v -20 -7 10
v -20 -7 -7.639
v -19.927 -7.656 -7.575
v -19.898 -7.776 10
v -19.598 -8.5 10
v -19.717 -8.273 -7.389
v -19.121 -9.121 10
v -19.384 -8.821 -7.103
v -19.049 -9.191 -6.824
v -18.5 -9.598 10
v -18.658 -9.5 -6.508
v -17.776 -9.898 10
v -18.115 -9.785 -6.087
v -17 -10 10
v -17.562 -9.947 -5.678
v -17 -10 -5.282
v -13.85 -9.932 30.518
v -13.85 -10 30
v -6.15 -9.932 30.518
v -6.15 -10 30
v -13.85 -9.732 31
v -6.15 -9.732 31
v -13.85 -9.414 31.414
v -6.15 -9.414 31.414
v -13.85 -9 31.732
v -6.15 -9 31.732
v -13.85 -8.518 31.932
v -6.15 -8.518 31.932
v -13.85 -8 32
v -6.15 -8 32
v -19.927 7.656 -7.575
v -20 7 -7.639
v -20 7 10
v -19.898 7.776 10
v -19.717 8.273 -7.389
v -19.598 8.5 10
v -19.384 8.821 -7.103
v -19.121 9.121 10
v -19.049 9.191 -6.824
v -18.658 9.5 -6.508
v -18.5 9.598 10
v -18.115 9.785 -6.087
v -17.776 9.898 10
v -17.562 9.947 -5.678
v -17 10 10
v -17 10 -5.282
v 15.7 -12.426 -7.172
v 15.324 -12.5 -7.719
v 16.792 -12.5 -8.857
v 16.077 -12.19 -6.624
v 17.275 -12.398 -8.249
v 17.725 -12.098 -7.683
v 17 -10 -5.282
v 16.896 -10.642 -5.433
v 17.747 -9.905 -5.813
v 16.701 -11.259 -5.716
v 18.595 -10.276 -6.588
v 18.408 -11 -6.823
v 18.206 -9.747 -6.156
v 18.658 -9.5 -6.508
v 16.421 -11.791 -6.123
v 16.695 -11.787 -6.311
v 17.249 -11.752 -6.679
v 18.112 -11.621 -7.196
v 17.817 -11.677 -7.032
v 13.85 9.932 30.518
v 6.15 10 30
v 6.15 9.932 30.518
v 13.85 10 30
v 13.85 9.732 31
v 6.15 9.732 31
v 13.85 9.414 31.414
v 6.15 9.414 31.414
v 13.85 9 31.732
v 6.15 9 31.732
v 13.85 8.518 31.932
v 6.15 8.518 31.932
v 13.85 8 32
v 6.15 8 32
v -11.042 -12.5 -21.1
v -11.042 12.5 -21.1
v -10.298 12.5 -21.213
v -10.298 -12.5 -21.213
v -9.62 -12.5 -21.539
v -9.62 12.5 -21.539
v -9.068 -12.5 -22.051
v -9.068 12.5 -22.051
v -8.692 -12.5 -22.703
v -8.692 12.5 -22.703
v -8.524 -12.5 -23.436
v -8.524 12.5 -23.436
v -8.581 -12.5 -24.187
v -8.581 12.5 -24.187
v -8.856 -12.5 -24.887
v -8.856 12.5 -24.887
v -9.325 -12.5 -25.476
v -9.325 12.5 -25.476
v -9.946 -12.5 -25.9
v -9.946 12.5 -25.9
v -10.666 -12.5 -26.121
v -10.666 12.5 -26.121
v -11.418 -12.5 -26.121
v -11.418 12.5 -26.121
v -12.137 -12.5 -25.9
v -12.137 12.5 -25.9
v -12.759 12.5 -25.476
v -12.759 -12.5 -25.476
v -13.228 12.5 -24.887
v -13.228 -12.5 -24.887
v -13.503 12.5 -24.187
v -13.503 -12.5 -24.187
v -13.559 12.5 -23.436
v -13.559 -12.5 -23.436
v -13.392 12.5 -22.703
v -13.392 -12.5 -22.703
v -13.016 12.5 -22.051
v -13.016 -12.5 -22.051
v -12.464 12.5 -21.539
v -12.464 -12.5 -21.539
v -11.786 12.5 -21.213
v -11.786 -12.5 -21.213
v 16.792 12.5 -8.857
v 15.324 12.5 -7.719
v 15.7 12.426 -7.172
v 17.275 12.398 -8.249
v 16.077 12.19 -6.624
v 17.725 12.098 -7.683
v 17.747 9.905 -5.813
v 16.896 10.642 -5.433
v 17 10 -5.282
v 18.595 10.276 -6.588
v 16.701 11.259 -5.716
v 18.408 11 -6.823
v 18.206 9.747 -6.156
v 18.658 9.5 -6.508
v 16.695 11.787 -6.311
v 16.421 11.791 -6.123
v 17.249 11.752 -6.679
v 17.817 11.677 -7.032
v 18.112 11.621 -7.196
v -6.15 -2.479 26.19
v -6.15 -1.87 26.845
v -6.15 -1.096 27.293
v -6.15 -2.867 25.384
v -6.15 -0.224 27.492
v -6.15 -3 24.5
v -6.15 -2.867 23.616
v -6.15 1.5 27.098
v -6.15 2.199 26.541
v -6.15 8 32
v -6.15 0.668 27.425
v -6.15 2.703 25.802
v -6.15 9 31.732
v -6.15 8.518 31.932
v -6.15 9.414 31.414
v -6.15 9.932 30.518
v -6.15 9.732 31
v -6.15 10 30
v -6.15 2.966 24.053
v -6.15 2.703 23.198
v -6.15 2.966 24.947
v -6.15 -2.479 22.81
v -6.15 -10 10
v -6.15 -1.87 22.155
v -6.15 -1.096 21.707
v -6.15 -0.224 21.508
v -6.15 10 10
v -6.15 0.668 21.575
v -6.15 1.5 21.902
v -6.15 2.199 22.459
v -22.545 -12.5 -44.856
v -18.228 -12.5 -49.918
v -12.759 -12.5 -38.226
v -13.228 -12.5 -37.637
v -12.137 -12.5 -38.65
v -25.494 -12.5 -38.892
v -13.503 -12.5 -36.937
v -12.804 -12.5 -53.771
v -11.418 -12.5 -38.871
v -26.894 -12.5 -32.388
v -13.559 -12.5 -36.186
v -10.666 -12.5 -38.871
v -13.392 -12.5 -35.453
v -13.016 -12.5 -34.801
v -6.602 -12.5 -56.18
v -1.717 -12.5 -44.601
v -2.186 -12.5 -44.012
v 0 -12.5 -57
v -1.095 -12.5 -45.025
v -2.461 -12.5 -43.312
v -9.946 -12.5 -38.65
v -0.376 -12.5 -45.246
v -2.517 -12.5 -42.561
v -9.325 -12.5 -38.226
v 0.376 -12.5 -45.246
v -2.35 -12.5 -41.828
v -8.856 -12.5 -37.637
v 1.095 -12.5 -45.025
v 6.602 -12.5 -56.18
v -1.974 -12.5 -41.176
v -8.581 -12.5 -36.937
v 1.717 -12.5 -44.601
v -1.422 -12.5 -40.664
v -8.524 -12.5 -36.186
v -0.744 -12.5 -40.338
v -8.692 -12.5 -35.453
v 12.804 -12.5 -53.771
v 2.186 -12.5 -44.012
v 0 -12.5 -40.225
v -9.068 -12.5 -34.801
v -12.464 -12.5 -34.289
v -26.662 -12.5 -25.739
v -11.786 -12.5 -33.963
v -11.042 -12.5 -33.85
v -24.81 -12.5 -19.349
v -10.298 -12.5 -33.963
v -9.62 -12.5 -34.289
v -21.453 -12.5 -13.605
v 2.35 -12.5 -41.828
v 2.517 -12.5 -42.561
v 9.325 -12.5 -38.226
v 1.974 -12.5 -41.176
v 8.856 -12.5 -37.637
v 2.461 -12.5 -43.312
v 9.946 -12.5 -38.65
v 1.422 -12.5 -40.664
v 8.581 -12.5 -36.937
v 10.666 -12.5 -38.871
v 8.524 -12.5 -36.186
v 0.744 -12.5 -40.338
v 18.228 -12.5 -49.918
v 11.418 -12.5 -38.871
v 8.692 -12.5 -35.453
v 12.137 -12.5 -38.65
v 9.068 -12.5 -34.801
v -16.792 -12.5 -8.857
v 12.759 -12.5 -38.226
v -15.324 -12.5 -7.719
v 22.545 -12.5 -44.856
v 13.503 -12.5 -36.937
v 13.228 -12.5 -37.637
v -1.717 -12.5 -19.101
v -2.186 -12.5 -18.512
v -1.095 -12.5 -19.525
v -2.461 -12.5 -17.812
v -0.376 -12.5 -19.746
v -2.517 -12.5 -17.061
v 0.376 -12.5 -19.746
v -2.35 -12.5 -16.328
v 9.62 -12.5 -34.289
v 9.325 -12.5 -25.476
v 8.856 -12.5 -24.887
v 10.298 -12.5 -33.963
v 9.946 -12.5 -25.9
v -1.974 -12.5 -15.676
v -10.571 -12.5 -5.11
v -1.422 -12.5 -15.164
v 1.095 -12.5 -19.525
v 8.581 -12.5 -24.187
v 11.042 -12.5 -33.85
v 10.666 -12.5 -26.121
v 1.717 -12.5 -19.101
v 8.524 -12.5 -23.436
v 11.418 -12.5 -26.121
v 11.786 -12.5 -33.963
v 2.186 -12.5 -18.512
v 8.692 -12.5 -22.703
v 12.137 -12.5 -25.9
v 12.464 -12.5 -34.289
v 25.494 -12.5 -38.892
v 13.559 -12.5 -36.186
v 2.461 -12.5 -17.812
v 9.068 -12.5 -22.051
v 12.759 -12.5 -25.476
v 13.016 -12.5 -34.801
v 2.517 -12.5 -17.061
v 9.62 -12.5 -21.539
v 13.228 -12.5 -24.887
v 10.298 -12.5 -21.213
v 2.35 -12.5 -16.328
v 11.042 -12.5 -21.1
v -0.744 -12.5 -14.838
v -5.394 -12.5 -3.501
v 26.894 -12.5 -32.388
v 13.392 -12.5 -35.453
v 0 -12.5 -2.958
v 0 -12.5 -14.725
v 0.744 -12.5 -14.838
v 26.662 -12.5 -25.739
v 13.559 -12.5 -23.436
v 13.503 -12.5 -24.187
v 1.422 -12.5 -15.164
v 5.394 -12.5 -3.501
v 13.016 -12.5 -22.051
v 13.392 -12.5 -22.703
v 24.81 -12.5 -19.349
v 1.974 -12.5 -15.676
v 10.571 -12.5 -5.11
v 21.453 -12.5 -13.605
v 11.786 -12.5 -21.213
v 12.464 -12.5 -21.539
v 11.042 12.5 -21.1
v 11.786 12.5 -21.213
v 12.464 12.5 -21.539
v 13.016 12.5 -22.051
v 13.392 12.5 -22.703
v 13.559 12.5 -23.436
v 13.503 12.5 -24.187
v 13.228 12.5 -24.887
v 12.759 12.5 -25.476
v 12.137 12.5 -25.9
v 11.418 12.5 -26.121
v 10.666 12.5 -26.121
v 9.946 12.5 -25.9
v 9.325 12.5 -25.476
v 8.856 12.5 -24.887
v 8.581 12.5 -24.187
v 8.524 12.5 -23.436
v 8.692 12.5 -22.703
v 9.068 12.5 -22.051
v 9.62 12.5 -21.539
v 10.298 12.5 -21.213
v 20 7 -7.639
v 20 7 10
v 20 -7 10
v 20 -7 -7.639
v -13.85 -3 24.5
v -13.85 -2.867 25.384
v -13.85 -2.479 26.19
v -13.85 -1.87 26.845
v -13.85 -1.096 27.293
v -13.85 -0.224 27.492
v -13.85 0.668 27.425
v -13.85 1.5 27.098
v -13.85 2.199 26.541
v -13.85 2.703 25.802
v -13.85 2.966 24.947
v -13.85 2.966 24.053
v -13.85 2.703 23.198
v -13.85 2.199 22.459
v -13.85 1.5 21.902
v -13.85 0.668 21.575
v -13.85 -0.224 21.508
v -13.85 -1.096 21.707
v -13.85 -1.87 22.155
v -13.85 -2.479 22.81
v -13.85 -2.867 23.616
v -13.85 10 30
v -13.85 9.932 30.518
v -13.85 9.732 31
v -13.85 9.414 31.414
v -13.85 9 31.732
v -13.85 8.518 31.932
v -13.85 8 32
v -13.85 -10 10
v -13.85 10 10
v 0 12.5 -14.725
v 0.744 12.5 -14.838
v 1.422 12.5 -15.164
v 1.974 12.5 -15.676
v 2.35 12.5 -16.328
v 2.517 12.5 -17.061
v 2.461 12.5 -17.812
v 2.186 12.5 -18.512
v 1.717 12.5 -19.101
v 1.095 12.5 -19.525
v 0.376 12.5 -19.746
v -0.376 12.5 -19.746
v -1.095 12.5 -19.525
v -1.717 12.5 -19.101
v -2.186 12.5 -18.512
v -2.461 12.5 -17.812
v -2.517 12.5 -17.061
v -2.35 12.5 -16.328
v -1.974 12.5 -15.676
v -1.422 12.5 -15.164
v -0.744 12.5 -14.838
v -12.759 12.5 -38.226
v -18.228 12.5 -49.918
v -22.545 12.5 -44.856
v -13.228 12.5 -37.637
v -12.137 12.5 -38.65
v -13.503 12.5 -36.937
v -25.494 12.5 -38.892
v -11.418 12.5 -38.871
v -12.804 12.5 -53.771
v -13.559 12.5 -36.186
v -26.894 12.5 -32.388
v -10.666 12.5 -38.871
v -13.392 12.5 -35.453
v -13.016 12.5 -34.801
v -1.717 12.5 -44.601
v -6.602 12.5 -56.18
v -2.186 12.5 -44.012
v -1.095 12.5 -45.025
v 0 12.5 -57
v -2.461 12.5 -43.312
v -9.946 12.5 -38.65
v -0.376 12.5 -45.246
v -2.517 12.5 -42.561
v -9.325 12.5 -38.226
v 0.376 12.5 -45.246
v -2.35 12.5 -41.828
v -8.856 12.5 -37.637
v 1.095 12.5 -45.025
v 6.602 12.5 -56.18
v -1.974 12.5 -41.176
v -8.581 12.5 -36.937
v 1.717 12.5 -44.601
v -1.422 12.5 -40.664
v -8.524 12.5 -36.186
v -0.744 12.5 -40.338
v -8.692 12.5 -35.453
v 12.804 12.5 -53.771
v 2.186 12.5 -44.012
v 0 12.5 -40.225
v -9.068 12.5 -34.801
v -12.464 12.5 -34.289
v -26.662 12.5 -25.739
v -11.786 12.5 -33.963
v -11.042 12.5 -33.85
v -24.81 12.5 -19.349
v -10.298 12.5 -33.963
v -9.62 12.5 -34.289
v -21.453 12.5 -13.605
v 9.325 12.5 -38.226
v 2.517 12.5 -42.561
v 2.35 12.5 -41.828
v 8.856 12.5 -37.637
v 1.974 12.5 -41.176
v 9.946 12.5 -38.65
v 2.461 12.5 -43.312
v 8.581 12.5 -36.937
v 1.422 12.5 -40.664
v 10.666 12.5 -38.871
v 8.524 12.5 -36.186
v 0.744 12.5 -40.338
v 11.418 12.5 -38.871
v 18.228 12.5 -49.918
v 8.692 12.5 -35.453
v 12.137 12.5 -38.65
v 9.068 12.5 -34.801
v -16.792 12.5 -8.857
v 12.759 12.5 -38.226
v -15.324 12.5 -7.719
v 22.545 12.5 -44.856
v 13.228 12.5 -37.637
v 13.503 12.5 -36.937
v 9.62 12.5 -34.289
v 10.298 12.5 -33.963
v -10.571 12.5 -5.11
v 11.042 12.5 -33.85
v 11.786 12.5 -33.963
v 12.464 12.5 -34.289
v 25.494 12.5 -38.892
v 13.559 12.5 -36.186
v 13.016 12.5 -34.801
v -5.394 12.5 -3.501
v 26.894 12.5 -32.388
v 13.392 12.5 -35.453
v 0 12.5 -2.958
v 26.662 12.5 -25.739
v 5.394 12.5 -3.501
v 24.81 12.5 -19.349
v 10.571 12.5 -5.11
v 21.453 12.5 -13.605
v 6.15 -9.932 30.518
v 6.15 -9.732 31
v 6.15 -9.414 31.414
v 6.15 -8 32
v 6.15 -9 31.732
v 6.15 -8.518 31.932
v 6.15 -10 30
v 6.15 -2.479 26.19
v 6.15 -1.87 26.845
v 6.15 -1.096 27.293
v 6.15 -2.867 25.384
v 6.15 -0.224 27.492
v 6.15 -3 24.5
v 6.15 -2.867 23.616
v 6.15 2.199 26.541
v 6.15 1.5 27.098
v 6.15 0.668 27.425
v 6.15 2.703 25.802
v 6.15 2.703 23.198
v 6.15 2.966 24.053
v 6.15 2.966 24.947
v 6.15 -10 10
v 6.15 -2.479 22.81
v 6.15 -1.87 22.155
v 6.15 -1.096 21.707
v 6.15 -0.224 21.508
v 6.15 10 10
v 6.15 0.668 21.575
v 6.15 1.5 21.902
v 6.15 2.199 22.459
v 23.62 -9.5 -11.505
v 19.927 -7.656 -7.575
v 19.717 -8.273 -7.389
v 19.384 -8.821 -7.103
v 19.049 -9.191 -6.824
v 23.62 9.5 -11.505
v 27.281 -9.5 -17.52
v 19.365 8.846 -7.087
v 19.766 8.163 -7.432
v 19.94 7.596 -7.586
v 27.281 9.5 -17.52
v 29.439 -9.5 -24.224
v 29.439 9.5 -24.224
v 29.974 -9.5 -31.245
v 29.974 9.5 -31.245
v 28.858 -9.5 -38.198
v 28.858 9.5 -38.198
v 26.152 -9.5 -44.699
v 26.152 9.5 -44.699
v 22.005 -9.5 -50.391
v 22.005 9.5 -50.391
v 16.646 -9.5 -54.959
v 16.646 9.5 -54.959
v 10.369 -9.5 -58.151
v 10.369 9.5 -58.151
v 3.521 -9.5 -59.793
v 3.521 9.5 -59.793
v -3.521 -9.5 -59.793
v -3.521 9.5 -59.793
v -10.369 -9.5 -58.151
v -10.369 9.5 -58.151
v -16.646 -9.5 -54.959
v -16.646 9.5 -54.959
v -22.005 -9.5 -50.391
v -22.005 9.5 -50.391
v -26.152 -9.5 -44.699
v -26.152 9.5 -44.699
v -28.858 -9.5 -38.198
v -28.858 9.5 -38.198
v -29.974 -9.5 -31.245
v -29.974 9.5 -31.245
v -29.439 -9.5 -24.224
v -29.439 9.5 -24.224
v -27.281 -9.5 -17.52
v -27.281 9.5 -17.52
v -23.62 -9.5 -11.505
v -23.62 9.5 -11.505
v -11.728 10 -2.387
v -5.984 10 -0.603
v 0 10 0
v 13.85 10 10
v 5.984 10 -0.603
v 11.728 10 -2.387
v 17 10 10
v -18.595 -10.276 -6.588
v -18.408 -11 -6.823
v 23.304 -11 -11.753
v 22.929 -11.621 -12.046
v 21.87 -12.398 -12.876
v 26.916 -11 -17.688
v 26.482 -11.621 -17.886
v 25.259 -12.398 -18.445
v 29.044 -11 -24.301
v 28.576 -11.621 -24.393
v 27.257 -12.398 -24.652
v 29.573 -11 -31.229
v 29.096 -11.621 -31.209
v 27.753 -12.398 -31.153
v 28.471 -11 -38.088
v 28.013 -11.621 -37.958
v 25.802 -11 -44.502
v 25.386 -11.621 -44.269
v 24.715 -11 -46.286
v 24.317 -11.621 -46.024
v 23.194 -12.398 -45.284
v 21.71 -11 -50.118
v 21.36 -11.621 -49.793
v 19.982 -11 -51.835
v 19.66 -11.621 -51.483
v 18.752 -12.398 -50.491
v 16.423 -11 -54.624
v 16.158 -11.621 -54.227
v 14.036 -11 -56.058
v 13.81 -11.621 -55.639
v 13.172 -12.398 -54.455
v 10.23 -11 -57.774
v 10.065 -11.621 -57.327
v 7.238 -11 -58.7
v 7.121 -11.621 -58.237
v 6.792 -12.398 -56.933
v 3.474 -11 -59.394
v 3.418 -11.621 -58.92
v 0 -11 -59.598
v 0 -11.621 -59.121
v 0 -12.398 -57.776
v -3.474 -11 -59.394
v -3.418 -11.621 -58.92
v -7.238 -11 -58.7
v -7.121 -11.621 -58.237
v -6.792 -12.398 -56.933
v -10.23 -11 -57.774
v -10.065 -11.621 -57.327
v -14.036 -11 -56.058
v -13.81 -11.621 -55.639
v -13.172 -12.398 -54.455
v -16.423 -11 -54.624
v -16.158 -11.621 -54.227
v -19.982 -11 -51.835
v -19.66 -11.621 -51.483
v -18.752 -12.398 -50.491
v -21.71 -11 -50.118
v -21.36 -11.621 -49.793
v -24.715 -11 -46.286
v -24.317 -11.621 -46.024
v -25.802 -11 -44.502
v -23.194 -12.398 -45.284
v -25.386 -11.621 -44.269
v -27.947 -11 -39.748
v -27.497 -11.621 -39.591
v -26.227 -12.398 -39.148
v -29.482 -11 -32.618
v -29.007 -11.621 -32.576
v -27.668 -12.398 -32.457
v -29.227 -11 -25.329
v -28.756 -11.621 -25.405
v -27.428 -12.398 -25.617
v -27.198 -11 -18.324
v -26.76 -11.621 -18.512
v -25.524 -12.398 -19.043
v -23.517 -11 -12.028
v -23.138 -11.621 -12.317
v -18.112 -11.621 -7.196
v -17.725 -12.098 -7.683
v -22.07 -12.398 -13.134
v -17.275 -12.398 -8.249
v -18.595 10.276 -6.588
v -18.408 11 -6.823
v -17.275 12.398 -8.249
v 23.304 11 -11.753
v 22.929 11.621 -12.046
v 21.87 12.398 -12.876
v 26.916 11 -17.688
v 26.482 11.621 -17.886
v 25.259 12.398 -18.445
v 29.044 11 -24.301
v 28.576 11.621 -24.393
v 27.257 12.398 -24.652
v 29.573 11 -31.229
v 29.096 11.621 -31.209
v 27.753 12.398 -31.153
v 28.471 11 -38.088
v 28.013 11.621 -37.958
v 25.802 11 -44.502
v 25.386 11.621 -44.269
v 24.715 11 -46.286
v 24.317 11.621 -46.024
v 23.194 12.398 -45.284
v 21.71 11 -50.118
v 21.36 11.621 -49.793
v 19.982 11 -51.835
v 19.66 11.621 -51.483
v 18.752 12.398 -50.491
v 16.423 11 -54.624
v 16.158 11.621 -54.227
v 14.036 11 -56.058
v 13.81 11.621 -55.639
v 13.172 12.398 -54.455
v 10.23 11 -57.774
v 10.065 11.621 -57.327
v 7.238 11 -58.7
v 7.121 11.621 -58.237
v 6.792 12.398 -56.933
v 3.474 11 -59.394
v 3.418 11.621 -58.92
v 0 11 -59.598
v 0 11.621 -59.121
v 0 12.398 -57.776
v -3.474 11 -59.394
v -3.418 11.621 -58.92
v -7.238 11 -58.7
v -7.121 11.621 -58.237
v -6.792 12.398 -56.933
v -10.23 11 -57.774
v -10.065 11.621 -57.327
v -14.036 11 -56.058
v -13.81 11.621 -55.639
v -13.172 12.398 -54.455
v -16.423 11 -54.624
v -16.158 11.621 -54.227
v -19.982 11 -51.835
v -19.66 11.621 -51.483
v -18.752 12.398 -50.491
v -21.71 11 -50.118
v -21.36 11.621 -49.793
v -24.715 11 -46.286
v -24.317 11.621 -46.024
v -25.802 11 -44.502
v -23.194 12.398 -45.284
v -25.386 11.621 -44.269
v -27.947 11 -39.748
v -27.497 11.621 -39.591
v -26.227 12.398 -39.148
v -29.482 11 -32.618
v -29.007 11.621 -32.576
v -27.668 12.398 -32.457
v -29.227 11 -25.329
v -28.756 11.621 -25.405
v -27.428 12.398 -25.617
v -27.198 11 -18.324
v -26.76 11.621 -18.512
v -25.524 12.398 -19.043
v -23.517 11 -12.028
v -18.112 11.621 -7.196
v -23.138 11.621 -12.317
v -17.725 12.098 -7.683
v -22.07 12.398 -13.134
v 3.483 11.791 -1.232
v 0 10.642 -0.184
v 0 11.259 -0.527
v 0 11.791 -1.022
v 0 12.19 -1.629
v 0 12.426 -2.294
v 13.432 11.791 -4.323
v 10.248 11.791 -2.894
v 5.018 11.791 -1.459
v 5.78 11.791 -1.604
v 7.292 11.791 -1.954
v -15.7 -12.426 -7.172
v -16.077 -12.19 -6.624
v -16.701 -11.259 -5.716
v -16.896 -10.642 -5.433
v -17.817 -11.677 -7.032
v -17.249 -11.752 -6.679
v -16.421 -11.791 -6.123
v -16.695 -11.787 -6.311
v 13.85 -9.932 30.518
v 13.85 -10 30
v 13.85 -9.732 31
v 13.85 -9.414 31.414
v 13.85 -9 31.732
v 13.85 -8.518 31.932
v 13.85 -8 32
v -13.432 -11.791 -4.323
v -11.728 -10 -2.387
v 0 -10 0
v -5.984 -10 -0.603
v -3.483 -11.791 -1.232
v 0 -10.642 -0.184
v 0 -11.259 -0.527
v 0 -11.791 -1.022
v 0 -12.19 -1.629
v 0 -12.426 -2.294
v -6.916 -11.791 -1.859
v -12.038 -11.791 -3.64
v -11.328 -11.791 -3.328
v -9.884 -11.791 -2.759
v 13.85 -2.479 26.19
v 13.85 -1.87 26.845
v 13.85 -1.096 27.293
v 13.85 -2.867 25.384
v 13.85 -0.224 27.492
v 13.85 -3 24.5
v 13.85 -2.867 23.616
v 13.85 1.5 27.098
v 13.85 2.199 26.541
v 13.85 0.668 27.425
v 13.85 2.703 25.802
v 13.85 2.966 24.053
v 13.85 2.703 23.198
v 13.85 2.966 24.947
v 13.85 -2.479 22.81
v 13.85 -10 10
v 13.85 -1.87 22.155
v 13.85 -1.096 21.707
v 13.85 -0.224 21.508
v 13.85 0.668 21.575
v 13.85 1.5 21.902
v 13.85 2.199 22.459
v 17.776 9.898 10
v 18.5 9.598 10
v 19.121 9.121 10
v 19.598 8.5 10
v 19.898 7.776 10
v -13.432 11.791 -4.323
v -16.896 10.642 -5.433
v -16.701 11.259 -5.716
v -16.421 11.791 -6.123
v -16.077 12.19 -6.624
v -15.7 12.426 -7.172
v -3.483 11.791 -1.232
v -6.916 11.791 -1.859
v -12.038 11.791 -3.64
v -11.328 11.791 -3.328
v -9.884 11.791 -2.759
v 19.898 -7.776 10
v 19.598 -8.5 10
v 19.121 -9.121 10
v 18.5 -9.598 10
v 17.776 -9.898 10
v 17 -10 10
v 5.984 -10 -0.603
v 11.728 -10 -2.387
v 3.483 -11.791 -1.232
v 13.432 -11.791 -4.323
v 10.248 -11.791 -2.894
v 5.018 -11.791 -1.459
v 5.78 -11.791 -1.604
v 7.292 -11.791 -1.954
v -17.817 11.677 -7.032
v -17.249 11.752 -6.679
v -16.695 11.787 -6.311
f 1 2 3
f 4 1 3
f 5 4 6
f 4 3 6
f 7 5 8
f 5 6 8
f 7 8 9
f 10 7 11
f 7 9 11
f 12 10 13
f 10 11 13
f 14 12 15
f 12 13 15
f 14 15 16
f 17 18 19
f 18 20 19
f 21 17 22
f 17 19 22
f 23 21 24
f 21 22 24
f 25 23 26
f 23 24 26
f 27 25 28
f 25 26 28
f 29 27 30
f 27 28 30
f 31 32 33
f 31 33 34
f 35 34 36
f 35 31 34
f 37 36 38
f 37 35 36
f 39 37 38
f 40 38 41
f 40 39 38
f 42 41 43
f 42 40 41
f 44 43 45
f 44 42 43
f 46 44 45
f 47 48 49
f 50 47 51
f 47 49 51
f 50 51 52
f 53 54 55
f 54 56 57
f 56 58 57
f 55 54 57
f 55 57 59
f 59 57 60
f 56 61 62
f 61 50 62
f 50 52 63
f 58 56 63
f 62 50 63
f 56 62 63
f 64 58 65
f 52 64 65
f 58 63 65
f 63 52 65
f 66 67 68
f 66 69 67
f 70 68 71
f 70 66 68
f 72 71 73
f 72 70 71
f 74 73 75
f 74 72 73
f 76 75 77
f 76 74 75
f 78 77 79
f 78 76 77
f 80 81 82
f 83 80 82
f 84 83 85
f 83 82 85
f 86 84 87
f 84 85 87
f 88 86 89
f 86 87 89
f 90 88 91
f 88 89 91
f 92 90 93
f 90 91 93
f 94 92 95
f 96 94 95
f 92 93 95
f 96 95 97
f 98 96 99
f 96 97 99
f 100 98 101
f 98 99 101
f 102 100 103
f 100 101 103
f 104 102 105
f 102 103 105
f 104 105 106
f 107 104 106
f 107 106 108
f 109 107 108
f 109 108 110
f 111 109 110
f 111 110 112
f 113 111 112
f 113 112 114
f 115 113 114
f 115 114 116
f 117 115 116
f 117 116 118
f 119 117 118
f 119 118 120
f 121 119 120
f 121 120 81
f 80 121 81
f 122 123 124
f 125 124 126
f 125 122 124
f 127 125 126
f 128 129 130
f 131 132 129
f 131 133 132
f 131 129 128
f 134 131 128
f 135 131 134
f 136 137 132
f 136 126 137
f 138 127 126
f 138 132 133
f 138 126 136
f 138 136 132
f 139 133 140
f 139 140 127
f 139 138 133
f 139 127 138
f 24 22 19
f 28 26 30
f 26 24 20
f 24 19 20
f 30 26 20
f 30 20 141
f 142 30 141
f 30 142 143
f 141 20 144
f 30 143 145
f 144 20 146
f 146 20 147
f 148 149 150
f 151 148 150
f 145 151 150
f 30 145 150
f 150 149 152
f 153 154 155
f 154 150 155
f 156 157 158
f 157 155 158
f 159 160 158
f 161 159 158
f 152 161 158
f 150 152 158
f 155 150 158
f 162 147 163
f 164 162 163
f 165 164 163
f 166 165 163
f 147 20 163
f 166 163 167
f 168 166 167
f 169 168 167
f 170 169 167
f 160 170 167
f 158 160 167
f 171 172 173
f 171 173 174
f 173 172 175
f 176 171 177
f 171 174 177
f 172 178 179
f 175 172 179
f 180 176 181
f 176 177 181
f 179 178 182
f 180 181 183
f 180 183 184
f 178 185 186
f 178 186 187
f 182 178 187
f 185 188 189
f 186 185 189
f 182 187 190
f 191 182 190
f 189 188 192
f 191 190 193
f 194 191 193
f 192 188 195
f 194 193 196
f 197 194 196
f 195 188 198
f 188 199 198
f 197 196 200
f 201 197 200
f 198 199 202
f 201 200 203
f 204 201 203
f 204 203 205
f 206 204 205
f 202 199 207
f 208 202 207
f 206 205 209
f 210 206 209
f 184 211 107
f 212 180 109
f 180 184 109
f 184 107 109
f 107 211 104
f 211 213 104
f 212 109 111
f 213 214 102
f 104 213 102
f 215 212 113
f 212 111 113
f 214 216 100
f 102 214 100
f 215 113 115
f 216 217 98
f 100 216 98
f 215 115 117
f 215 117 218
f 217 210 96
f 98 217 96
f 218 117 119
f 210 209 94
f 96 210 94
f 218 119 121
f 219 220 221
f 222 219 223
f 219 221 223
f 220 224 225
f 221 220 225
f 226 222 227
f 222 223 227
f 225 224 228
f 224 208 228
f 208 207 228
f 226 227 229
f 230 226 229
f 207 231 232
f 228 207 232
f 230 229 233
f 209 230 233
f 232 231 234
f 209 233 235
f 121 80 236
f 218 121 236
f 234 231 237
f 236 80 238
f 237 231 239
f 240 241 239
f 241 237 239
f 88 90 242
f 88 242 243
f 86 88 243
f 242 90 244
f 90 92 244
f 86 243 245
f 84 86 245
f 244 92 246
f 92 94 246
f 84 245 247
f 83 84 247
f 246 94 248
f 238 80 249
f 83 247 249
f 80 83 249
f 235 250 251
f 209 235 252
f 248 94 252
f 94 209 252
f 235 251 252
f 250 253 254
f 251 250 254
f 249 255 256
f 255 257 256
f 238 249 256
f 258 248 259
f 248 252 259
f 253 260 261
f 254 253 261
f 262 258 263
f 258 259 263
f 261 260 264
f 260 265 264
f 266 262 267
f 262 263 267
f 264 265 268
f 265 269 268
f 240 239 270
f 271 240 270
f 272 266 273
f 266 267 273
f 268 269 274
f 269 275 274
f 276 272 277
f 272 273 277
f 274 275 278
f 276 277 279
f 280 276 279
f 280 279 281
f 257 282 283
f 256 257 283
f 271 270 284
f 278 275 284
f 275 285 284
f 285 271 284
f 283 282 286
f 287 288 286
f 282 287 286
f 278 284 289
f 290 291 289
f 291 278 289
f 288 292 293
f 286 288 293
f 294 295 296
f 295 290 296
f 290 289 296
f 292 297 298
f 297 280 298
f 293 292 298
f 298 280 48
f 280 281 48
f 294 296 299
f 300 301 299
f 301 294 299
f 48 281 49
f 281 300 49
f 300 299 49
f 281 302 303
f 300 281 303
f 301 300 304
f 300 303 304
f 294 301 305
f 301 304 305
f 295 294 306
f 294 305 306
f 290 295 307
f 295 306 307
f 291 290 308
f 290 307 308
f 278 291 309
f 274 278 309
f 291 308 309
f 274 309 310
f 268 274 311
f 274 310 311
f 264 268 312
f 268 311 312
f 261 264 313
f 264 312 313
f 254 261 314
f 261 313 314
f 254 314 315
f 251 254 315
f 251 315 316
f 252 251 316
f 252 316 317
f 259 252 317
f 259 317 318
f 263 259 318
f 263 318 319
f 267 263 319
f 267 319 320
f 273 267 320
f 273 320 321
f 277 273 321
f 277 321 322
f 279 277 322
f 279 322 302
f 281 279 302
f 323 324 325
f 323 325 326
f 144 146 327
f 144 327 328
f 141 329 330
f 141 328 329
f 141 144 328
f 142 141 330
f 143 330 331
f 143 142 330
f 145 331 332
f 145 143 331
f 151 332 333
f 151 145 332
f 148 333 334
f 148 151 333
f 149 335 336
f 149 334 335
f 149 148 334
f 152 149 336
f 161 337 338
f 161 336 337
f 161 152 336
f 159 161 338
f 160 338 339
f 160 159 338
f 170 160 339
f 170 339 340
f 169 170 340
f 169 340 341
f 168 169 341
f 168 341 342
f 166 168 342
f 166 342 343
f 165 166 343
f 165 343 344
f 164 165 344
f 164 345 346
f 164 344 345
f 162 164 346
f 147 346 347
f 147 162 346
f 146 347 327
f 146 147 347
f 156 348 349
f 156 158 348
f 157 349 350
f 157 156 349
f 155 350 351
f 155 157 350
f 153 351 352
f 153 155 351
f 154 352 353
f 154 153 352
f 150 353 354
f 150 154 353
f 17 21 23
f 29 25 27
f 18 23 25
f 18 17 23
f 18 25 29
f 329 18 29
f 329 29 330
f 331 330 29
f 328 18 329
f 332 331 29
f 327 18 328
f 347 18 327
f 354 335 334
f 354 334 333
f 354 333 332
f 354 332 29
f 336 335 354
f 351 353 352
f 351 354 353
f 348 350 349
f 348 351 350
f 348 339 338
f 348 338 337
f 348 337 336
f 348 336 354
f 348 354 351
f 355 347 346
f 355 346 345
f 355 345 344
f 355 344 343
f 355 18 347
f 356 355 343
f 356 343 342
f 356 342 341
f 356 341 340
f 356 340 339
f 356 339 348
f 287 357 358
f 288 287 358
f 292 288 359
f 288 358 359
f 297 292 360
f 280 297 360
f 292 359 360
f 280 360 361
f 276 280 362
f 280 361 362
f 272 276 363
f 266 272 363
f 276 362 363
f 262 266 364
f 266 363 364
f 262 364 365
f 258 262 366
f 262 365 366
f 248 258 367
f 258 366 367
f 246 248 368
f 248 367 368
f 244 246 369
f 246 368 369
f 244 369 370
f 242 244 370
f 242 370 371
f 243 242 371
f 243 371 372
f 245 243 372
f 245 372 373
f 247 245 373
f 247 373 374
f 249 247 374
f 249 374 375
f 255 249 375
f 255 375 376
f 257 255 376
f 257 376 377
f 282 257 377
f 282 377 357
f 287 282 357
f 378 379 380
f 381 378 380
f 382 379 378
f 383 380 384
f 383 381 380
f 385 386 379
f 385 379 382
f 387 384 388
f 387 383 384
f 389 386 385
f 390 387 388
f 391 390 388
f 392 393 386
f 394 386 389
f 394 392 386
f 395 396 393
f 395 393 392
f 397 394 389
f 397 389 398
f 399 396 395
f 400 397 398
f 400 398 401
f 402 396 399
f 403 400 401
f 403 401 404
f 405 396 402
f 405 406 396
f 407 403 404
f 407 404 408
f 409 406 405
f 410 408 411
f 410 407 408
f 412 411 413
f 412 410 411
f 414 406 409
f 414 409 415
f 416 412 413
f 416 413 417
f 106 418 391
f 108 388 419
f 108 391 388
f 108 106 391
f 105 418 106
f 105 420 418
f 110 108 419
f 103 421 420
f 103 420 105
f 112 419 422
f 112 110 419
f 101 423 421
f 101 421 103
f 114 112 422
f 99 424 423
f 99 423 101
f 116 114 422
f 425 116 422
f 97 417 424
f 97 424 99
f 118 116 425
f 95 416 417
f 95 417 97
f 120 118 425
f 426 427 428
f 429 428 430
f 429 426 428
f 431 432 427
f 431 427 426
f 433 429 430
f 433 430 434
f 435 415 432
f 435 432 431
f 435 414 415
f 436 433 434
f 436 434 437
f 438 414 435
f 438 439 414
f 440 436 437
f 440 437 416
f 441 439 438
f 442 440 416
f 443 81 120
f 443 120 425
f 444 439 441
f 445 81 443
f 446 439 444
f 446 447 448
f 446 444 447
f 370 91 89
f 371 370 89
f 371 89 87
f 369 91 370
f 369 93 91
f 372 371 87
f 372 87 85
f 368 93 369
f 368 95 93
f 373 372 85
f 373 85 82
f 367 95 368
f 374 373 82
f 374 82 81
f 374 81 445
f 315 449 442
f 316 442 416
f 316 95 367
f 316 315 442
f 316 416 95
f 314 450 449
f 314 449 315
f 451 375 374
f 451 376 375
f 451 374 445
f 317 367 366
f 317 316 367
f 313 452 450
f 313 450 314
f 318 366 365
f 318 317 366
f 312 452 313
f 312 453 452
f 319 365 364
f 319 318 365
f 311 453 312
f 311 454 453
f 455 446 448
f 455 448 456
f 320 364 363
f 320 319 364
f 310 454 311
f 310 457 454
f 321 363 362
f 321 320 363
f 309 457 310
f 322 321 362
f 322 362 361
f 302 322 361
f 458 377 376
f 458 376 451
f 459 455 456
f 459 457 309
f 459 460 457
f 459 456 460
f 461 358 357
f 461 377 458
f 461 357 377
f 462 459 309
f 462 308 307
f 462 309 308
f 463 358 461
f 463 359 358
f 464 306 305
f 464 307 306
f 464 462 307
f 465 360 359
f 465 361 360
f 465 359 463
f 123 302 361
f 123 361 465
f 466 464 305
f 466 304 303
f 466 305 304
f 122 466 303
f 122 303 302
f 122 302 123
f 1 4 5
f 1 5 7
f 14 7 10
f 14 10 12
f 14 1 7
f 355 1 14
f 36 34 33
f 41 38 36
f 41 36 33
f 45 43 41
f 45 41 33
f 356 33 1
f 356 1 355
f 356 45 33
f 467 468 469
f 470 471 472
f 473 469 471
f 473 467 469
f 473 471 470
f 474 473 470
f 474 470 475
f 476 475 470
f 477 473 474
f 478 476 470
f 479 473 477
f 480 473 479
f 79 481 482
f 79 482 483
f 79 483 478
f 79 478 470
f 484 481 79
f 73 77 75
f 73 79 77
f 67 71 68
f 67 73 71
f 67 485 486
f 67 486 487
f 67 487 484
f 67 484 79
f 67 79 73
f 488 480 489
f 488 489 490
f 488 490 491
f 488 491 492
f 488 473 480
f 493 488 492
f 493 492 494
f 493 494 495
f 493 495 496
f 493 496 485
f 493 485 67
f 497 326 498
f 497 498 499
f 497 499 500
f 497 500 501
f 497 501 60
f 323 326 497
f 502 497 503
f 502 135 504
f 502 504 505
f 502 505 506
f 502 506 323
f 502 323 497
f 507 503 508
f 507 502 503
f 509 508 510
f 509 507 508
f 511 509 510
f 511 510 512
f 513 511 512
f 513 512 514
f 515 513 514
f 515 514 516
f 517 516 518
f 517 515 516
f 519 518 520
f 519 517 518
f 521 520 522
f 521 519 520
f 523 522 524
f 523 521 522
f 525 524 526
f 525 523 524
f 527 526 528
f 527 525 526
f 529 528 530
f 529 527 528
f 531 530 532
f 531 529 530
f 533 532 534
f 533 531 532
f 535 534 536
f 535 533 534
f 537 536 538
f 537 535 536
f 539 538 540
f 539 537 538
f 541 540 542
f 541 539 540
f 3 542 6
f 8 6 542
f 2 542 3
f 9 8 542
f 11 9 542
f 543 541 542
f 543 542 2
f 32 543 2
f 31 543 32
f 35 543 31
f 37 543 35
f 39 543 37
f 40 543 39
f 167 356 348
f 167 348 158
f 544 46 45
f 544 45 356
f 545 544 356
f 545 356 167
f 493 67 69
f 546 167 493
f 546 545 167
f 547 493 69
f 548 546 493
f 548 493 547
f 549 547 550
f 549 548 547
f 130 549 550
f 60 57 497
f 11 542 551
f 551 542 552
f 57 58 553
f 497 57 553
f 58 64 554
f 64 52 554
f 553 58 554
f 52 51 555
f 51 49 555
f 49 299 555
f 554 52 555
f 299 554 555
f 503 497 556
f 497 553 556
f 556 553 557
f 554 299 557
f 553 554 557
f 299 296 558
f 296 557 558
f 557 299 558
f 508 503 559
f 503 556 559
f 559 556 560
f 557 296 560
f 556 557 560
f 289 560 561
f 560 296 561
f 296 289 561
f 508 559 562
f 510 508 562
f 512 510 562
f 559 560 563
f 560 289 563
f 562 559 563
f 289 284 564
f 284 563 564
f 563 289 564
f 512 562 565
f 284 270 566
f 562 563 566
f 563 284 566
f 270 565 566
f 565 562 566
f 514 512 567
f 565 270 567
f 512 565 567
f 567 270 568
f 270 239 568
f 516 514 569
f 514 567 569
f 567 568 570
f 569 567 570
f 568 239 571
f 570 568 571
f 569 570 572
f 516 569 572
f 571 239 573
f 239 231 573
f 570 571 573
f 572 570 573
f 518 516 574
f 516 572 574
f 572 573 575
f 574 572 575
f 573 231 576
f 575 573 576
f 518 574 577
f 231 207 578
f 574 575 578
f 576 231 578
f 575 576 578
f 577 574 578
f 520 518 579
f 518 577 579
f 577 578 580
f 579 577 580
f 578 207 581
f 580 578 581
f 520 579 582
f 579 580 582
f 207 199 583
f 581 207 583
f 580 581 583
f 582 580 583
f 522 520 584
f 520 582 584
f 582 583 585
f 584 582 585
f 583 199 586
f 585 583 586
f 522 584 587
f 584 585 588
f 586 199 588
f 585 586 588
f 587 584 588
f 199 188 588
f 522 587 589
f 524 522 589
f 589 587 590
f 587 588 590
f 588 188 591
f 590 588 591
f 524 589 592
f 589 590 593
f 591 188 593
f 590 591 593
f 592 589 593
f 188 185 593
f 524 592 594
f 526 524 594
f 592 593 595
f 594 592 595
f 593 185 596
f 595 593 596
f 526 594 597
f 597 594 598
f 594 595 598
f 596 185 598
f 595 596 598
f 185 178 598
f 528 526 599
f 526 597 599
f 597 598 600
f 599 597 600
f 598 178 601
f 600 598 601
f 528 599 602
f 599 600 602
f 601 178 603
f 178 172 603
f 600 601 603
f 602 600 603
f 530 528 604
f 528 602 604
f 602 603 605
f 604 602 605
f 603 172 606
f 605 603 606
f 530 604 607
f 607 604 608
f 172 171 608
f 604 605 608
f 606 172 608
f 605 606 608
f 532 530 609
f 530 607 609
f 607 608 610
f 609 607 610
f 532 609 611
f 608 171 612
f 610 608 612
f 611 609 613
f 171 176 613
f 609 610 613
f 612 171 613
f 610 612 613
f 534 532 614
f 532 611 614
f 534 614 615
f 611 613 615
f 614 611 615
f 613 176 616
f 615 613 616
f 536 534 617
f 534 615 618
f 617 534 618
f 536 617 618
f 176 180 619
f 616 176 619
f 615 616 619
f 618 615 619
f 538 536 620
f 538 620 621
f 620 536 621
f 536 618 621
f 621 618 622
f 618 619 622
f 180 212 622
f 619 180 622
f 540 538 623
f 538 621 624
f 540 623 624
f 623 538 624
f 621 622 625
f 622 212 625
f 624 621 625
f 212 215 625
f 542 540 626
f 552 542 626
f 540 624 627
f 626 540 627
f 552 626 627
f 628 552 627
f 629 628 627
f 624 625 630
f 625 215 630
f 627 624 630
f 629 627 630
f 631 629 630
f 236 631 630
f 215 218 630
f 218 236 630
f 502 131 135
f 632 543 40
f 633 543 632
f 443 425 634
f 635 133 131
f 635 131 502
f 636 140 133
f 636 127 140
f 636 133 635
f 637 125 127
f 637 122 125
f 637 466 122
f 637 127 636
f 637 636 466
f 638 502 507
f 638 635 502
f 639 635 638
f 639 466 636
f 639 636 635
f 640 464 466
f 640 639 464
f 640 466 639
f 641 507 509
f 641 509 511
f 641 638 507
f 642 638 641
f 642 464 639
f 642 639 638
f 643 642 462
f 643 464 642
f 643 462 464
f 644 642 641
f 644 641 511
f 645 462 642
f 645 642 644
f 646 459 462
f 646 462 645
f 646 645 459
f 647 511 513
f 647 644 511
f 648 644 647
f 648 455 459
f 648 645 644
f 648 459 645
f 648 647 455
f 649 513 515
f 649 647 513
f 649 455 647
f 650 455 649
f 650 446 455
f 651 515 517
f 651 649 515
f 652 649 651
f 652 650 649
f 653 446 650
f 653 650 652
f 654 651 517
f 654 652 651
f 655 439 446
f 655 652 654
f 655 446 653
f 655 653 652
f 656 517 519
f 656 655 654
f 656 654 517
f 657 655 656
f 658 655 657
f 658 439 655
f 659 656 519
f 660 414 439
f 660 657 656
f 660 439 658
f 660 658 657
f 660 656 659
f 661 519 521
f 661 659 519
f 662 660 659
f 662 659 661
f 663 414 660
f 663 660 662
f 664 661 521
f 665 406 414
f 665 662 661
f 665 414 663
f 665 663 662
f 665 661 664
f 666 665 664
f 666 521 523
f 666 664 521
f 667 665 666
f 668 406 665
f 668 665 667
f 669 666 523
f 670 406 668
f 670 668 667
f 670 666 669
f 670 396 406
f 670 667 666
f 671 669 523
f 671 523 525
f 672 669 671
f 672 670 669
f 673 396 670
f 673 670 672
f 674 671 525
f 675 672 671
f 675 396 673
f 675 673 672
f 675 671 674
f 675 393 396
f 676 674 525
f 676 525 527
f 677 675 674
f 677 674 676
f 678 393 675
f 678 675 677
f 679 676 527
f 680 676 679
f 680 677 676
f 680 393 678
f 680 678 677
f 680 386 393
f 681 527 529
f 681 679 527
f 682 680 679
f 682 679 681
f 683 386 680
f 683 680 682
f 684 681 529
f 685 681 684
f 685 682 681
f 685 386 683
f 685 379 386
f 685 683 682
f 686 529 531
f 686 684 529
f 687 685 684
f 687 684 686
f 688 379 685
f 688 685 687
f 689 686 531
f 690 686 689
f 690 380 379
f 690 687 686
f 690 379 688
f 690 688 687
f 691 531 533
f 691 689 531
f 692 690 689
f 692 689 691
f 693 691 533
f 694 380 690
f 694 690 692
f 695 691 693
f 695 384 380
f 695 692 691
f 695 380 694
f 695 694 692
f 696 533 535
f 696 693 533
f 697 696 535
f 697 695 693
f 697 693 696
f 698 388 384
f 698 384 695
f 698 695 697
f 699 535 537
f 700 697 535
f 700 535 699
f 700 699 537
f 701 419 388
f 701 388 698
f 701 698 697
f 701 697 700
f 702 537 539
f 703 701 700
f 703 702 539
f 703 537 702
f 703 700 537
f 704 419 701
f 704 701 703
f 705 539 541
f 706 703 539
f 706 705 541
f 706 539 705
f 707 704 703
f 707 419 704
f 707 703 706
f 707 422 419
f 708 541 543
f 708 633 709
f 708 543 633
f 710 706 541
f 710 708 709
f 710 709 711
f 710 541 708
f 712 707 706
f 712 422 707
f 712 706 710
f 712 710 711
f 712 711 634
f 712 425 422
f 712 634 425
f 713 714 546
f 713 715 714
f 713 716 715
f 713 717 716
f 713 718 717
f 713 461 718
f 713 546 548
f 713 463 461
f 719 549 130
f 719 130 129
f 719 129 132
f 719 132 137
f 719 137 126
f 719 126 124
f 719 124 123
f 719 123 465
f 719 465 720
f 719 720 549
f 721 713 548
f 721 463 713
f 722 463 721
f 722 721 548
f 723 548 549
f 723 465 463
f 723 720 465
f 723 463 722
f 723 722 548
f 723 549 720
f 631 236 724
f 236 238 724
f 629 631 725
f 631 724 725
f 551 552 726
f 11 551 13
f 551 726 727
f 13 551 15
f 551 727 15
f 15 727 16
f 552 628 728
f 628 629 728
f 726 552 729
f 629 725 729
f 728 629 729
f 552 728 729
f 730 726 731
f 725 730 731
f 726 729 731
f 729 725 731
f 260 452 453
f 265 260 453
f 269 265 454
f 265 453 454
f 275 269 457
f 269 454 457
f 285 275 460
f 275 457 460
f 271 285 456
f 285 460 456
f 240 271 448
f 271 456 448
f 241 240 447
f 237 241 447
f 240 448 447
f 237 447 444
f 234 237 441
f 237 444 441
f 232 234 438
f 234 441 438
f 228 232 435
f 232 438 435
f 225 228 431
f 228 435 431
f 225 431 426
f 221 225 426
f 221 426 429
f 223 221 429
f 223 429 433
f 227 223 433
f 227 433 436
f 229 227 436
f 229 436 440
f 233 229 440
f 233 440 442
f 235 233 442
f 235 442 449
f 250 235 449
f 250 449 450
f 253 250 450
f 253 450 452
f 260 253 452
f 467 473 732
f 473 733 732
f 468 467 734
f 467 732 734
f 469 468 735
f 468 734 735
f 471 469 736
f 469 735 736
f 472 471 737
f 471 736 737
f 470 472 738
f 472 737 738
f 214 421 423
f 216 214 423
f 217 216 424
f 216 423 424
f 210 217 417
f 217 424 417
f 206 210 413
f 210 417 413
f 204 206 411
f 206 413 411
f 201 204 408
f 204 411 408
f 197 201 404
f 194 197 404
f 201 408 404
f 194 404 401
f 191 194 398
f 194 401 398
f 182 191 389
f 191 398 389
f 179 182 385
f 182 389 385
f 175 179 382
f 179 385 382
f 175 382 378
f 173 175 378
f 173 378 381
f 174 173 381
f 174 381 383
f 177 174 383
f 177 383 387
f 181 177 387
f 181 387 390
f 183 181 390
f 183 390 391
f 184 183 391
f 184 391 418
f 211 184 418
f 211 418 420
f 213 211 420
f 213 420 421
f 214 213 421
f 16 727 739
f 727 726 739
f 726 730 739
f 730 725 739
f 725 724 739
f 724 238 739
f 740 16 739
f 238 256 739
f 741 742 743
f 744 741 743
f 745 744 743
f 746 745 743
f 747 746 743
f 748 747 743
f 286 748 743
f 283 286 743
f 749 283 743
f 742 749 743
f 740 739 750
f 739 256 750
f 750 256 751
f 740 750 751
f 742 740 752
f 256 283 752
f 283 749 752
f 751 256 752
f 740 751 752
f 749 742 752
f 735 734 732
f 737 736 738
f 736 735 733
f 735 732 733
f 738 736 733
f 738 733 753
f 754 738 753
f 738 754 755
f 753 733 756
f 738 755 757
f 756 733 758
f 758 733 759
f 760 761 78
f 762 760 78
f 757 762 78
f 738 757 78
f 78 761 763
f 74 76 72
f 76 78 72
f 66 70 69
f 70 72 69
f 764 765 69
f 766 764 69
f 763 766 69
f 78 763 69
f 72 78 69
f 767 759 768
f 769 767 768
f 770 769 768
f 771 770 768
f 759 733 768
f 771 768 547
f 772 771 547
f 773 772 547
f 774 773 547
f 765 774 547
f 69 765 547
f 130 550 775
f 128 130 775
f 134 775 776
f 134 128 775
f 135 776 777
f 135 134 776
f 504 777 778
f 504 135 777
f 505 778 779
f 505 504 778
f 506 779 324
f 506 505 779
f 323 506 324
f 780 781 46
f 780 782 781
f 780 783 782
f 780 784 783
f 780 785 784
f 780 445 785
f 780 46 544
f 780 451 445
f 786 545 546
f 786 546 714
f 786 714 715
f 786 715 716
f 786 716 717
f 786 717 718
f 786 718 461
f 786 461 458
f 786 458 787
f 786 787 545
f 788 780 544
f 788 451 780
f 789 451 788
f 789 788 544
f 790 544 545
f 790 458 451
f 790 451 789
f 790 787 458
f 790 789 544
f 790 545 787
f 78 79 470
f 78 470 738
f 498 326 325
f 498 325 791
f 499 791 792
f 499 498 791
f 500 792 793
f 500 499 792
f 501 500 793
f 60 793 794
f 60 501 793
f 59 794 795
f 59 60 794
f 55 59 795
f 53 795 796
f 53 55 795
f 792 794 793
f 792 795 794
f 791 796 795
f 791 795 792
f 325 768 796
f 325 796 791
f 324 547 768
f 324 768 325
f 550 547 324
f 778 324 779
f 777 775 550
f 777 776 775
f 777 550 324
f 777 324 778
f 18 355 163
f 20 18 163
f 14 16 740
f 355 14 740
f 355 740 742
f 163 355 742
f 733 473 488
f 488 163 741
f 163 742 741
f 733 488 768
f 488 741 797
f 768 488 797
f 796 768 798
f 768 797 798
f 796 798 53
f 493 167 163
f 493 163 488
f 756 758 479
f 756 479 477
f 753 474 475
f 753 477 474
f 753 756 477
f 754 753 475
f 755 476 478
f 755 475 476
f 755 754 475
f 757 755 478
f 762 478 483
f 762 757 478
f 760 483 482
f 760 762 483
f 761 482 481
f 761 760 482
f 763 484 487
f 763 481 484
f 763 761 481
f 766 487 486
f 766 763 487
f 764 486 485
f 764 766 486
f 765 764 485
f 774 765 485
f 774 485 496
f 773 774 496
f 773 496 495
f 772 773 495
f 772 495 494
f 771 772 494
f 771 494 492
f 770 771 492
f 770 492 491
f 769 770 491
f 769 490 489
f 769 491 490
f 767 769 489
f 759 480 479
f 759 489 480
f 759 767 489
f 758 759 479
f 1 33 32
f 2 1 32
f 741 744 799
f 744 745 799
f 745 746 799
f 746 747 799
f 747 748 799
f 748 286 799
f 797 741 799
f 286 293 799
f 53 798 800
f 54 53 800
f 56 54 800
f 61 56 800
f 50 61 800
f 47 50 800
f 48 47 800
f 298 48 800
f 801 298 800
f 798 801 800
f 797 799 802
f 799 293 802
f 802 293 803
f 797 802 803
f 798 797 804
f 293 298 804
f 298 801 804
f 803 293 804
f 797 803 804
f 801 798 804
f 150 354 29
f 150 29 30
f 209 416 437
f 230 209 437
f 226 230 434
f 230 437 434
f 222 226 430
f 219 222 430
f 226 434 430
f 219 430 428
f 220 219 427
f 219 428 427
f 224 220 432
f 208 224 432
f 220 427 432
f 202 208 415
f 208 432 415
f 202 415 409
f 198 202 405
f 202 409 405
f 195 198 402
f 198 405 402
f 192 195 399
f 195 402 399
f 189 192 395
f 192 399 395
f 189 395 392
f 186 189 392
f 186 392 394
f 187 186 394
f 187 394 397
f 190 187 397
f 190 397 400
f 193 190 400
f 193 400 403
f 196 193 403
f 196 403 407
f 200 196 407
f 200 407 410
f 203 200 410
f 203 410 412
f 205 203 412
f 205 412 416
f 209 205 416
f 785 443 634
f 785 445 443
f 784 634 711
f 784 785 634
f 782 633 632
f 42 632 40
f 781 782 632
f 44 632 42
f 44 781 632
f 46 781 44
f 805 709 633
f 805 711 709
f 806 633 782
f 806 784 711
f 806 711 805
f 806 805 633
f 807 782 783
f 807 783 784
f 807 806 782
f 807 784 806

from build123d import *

# Parameters (mm, degrees)
SKETCH1_W               = 40
SKETCH1_H               = 20
BOSS_EXTRUDE1_DEPTH     = 10
FILLET1_R               = 3
SKETCH3_R               = 30
BOSS_EXTRUDE2_DEPTH     = 12.5
FILLET2_R               = 3
SKETCH5_R               = 2.524516272
CUT_EXTRUDE1_DEPTH      = 72.589105477
SKETCH6_W               = 7.7
SKETCH6_H               = 20
BOSS_EXTRUDE3_DEPTH     = 22
CUT_EXTRUDE3_DEPTH      = 76.359621305
CUT_EXTRUDE3_DEPTH_BACK = 76.359621305
SKETCH7_R               = 3
FILLET3_R               = 2


with BuildPart() as part:
    # Sketch1 → Boss-Extrude1 (new, symmetric)
    with BuildSketch(Plane(origin=(0, 0, 0), x_dir=(1, 0, 0), z_dir=(0, 1, 0))):
        Rectangle(SKETCH1_W, SKETCH1_H)
    extrude(amount=BOSS_EXTRUDE1_DEPTH, both=True)

    # Fillet1
    fillet1_edges = [part.edges().sort_by_distance(p)[0] for p in [
        (20, 10, 0),
        (-20, 10, 0),
        (20, -10, 0),
        (-20, -10, 0),
    ]]
    fillet(fillet1_edges, radius=FILLET1_R)

    # Sketch3 → Boss-Extrude2 (add, symmetric)
    with BuildSketch(Plane(origin=(0, 0, 0), x_dir=(1, 0, 0), z_dir=(0, 1, 0))):
        with Locations(Location((0, 30, 0), (0, 0, 270))):
            Circle(SKETCH3_R)
    extrude(amount=BOSS_EXTRUDE2_DEPTH, both=True)

    # Fillet2
    fillet2_edges = [part.edges().sort_by_distance(p)[0] for p in [
        (0, -12.5, -60),
        (0, 12.5, -60),
    ]]
    fillet(fillet2_edges, radius=FILLET2_R)

    # Sketch5 → Cut-Extrude1 (cut, through all)
    with BuildSketch(Plane(origin=(0, 12.5, 0), x_dir=(1, 0, 0), z_dir=(0, 1, 0))):
        with Locations(Location((0, 42.75, 0), (0, 0, 270))):
            Circle(SKETCH5_R)
        with Locations(Location((11.041823898, 36.375, 0), (0, 0, 270))):
            Circle(SKETCH5_R)
        with Locations(Location((11.041823898, 23.625, 0), (0, 0, 270))):
            Circle(SKETCH5_R)
        with Locations(Location((0, 17.25, 0), (0, 0, 270))):
            Circle(SKETCH5_R)
        with Locations(Location((-11.041823898, 23.625, 0), (0, 0, 270))):
            Circle(SKETCH5_R)
        with Locations(Location((-11.041823898, 36.375, 0), (0, 0, 270))):
            Circle(SKETCH5_R)
    extrude(amount=-CUT_EXTRUDE1_DEPTH, mode=Mode.SUBTRACT)

    # Sketch6 → Boss-Extrude3 (add)
    with BuildSketch(Plane.XY.offset(10)):
        with Locations((-10, 0)):
            Rectangle(SKETCH6_W, SKETCH6_H)
        with Locations((10, 0)):
            Rectangle(SKETCH6_W, SKETCH6_H)
    extrude(amount=BOSS_EXTRUDE3_DEPTH)

    # Sketch7 → Cut-Extrude3 (cut, two sides: drawn at the far end of the back side and taken through both)
    with BuildSketch(Plane.ZY.offset(13.85).offset(-CUT_EXTRUDE3_DEPTH_BACK)):
        with Locations(Location((24.5, 0, 0), (0, 0, 270))):
            Circle(SKETCH7_R)
    extrude(amount=CUT_EXTRUDE3_DEPTH + CUT_EXTRUDE3_DEPTH_BACK, mode=Mode.SUBTRACT)

    # Fillet3
    fillet3_edges = [part.edges().sort_by_distance(p)[0] for p in [
        (-10, 10, 32),
        (-10, -10, 32),
        (10, 10, 32),
        (10, -10, 32),
    ]]
    fillet(fillet3_edges, radius=FILLET3_R)


solid = part.part
